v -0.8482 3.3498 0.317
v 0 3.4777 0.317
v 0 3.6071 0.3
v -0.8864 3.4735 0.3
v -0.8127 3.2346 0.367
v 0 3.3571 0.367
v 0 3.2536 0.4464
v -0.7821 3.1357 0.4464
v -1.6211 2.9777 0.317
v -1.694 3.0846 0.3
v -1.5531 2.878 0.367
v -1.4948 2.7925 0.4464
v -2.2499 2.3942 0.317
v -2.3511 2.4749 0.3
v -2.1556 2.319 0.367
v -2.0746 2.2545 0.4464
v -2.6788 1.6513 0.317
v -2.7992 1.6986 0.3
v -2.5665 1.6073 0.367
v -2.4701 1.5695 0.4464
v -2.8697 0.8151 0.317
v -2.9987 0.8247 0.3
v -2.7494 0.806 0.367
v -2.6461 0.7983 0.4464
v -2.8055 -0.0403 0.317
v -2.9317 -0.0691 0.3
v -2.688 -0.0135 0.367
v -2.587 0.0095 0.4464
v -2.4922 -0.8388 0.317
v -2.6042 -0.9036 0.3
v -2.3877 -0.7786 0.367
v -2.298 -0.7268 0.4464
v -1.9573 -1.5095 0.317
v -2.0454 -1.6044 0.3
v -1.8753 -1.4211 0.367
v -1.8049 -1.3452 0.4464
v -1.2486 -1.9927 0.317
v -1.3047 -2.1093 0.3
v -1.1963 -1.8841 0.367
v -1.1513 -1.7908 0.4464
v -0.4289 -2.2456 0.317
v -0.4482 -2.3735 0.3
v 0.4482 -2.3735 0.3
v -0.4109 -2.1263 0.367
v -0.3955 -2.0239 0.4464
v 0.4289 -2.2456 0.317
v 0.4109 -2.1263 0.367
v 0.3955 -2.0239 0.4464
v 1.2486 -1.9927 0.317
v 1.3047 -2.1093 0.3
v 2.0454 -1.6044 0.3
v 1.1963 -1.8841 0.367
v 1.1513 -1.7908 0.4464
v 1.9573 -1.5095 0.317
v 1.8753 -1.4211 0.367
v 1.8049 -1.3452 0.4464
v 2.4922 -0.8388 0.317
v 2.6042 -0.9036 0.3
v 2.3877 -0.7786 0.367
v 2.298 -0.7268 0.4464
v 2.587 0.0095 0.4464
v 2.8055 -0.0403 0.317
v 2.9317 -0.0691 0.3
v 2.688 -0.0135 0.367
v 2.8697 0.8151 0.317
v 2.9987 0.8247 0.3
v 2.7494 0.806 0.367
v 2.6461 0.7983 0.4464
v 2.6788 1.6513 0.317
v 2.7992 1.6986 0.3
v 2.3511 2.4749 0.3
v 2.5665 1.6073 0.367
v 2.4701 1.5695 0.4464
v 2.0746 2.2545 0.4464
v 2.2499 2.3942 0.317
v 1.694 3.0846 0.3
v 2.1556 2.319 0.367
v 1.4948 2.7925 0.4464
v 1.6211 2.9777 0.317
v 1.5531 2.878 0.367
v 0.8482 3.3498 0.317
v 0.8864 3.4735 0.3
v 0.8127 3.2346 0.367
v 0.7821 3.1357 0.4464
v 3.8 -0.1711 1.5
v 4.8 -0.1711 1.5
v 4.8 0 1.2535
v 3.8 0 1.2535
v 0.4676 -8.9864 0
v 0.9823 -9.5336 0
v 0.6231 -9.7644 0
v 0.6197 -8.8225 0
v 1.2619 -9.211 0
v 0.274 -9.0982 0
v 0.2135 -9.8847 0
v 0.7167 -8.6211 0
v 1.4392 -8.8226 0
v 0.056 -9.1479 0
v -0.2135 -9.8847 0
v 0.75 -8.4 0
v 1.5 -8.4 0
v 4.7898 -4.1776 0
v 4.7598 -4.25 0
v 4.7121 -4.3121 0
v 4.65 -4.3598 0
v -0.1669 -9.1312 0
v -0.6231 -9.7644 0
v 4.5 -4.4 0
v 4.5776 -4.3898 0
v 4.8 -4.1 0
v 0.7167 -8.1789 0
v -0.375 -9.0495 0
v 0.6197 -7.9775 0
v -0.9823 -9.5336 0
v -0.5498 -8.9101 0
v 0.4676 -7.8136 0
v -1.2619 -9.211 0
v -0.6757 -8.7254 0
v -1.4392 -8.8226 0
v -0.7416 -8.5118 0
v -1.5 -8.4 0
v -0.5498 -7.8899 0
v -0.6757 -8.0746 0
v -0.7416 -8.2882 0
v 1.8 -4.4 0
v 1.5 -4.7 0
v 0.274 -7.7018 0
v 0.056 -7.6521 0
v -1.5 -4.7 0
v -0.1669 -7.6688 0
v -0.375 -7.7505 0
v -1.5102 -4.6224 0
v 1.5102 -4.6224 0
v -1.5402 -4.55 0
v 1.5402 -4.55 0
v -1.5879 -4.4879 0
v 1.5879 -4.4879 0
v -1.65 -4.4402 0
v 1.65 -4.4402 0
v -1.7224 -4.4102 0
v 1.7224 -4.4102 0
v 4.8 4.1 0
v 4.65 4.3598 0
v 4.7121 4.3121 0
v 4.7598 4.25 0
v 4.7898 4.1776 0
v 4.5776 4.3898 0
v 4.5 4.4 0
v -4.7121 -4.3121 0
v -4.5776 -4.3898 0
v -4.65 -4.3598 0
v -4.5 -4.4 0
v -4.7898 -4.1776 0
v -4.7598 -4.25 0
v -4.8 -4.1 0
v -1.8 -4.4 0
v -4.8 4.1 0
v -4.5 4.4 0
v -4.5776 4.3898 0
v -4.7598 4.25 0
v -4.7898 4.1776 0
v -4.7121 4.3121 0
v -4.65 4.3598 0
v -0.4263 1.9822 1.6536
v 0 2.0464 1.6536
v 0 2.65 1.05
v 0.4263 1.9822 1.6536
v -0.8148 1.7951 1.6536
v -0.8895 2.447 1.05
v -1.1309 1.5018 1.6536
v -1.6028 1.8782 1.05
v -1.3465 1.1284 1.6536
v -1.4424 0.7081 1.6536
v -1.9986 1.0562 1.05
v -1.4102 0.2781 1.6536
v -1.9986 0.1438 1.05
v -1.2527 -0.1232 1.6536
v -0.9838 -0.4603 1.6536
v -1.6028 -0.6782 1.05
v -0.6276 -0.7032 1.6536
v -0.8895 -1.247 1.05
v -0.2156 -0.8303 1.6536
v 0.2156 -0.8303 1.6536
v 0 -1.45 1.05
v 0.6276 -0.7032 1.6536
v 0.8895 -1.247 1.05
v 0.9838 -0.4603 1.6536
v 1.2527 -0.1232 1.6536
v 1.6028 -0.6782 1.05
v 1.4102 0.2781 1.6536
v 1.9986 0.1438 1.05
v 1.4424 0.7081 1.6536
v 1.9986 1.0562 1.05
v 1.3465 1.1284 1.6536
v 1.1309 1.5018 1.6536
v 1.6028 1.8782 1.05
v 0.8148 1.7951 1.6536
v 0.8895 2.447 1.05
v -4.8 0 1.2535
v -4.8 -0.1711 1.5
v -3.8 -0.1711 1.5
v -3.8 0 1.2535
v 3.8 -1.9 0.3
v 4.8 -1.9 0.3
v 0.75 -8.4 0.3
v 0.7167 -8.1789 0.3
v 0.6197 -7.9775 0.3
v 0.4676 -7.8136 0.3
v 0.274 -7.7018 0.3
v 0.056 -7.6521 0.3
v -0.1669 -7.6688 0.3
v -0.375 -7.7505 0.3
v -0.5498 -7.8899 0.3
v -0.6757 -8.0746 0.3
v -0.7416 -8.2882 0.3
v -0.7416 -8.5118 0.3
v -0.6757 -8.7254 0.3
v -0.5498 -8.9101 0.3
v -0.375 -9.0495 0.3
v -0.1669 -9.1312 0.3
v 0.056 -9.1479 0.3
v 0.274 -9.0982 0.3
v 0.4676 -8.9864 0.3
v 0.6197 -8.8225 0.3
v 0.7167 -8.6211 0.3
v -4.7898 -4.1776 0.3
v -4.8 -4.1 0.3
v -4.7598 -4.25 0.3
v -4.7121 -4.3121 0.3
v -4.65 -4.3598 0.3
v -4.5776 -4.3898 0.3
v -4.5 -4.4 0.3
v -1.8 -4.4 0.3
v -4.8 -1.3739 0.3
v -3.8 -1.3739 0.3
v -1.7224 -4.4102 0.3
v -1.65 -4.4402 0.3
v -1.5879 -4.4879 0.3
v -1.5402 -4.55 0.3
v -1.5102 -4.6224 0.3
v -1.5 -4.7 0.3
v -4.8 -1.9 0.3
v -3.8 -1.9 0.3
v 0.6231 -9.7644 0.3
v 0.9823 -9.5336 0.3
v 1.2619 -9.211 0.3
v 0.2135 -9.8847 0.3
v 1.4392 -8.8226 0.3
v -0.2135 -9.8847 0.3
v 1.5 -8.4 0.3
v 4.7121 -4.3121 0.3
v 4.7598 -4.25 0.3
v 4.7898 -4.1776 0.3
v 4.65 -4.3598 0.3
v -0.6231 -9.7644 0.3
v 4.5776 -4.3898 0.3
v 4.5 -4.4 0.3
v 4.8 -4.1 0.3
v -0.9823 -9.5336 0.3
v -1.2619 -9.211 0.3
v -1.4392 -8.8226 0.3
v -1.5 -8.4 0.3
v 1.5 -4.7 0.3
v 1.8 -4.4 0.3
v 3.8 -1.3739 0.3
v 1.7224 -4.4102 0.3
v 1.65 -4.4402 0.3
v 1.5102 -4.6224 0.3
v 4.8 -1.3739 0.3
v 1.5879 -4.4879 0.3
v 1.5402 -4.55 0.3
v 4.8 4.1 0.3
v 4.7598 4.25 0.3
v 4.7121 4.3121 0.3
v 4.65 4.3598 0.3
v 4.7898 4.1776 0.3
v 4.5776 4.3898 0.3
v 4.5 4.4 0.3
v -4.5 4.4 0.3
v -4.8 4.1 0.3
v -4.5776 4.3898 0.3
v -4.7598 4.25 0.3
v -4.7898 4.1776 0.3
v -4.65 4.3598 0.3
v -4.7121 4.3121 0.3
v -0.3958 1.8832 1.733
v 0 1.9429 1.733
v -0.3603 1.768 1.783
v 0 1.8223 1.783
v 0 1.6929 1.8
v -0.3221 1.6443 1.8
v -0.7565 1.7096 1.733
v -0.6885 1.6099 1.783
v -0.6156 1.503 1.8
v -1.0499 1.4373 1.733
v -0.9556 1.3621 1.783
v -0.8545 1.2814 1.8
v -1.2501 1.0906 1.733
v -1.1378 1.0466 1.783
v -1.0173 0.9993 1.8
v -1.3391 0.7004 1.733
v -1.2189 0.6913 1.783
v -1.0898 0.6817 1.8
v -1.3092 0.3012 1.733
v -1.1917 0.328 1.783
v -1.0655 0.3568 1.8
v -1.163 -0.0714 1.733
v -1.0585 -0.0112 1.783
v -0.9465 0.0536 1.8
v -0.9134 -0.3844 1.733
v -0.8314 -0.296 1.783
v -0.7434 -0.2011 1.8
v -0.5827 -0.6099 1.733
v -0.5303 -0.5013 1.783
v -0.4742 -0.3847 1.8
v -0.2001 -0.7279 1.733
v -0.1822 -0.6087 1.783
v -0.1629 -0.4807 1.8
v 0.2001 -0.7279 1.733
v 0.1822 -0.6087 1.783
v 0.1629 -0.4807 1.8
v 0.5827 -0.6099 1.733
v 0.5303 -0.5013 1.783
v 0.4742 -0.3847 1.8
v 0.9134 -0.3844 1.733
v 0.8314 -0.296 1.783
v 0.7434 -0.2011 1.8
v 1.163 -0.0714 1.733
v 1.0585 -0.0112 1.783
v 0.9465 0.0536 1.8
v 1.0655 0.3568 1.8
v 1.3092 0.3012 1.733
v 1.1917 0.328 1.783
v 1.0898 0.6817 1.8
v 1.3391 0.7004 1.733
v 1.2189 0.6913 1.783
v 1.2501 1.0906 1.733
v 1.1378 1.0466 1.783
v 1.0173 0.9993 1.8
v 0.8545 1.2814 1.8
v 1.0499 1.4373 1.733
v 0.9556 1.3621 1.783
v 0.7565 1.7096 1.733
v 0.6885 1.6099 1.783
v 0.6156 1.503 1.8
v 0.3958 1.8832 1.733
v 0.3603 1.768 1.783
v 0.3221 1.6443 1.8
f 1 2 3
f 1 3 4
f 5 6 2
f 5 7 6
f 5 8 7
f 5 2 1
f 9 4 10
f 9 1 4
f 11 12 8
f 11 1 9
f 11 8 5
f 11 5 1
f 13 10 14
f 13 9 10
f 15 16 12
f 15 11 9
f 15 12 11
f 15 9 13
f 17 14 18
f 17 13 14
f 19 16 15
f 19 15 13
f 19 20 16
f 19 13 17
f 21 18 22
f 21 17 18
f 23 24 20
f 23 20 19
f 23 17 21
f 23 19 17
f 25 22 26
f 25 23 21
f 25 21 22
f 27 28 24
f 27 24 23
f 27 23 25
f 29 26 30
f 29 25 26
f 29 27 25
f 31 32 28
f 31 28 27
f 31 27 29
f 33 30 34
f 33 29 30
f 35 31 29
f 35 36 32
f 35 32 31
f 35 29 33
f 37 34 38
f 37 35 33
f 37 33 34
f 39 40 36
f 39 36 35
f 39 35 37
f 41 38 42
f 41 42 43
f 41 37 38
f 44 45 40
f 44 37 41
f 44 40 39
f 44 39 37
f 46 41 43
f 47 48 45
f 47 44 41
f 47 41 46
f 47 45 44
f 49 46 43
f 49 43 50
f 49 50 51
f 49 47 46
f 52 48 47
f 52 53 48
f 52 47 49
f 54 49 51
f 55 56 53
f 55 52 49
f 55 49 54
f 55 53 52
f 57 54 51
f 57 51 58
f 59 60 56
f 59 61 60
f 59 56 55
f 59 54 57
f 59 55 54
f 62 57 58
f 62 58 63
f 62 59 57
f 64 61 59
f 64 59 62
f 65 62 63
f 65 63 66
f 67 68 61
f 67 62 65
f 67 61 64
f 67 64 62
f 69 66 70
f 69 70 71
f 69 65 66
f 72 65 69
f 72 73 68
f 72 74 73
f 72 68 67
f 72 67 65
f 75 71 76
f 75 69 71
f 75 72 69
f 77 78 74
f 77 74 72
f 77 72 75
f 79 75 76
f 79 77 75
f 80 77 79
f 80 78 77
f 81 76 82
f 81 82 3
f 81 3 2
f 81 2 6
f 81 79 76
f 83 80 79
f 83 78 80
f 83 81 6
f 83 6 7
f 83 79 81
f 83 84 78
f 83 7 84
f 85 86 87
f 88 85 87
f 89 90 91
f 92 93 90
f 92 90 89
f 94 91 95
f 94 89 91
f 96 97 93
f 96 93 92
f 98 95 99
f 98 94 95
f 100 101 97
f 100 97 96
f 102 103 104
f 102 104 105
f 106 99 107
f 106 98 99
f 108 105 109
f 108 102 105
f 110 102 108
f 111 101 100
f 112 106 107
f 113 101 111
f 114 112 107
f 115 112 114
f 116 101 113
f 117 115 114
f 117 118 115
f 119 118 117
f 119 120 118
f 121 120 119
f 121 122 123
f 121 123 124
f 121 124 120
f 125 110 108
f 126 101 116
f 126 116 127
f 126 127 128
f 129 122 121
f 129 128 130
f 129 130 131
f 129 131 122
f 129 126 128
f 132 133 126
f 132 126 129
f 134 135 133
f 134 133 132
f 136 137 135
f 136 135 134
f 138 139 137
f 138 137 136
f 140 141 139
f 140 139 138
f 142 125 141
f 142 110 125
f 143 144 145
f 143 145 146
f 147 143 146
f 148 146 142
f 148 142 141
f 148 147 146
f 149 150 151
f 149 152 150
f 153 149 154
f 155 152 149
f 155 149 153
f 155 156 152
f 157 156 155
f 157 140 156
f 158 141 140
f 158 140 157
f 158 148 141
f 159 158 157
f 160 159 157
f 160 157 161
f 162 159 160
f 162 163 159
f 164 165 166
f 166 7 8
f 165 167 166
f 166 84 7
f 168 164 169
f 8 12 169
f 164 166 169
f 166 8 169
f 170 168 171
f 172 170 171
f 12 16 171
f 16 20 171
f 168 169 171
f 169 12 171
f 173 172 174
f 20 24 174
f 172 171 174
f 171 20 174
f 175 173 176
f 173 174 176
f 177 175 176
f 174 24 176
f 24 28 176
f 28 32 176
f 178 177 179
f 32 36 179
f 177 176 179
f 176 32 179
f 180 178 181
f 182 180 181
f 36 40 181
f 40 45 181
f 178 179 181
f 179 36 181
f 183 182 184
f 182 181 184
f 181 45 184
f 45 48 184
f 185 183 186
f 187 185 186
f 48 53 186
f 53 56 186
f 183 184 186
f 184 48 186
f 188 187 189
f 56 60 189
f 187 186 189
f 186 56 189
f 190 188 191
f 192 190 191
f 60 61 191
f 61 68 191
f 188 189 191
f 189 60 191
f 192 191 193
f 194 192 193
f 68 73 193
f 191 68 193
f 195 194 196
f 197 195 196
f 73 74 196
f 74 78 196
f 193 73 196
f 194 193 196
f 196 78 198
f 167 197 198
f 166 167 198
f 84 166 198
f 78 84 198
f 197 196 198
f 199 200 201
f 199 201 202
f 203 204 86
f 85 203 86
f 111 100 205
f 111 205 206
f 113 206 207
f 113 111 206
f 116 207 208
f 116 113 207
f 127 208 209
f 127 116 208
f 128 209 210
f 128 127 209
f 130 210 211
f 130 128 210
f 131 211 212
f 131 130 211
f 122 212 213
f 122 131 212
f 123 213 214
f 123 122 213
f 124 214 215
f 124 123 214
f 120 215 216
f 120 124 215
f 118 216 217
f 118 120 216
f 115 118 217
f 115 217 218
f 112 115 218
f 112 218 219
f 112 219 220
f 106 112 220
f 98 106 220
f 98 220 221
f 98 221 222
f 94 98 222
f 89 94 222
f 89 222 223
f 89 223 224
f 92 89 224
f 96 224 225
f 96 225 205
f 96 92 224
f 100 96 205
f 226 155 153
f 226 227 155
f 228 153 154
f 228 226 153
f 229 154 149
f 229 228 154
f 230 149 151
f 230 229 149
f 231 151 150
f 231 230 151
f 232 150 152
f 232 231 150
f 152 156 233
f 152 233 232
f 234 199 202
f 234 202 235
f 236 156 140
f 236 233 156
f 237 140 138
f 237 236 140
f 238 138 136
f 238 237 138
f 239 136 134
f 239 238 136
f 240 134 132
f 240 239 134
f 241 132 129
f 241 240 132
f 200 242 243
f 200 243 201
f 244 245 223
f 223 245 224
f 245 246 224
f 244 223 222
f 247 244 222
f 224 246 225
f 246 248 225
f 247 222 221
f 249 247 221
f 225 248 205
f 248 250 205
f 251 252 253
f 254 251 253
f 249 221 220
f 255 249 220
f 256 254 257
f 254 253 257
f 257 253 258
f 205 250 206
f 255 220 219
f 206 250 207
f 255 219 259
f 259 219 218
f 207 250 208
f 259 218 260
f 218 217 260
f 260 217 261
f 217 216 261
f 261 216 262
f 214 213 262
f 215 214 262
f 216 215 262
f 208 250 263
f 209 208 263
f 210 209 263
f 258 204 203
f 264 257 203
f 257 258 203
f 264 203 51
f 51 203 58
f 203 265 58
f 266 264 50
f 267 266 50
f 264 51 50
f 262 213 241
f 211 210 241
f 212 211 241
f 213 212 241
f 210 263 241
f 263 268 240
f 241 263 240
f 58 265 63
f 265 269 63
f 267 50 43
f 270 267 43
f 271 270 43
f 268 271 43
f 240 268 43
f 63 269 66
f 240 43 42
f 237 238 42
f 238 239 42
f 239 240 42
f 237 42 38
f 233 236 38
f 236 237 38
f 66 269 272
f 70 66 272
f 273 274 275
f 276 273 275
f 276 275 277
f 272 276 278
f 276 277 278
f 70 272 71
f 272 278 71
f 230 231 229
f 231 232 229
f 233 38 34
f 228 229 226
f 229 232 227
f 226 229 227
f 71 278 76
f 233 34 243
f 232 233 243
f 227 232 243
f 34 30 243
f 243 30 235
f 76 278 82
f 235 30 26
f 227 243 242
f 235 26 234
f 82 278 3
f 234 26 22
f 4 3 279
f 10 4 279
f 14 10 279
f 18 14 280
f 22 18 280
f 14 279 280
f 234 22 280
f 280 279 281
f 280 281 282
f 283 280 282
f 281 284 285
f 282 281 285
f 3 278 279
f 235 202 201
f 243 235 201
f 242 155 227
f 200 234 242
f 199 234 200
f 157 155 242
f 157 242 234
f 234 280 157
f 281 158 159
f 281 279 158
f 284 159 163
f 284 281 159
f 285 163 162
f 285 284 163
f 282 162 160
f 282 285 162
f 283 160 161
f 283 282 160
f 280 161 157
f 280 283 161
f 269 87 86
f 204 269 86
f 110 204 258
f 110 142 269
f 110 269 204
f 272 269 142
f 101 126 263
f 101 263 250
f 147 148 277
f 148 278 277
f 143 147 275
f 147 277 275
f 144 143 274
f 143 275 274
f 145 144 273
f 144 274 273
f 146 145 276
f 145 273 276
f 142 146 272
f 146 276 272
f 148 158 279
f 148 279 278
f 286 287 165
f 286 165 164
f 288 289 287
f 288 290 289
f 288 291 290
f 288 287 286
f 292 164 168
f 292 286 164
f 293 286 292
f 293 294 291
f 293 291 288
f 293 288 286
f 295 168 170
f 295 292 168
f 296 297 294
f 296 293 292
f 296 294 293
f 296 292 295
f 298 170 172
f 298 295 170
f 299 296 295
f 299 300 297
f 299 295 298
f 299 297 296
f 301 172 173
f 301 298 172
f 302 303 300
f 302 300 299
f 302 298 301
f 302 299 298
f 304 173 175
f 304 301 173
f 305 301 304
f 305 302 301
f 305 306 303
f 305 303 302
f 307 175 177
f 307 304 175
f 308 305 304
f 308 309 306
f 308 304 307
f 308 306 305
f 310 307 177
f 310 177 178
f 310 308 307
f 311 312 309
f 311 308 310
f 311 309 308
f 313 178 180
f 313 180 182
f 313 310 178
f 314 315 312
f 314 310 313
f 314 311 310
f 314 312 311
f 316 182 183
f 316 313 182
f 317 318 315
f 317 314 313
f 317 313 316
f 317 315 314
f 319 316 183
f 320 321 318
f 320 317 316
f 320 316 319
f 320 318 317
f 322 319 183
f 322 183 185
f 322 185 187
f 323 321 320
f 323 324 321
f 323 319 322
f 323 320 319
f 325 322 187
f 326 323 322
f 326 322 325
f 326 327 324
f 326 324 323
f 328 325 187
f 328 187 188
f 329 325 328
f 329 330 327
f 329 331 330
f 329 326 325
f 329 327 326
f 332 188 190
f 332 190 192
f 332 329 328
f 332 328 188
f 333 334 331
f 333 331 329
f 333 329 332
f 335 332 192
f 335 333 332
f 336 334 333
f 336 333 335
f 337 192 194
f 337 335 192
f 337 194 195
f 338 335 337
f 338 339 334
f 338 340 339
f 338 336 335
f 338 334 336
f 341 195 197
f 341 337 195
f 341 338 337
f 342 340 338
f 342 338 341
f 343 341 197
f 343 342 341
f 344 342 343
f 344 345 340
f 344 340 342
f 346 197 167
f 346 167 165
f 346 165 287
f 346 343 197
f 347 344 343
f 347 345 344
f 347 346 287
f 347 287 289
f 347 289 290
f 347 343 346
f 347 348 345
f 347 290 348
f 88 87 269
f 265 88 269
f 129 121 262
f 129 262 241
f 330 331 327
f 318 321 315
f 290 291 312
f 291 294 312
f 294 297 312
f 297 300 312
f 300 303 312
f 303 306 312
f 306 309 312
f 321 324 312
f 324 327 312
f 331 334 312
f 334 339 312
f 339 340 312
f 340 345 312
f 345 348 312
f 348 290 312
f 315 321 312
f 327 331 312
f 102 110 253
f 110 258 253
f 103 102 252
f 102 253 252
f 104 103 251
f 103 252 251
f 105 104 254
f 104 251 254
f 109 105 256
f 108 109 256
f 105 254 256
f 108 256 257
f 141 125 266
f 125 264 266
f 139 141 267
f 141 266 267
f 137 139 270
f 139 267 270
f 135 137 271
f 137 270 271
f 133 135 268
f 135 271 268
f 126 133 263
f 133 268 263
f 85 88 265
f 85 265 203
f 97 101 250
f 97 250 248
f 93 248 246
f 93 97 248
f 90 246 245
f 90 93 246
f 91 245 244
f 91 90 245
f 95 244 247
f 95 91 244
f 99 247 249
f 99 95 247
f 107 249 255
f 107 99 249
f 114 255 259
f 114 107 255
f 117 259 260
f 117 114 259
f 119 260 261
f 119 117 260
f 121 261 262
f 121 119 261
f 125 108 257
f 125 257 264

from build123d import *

# Parameters (mm, degrees)
SKETCH1_R           = 0.75
BOSS_EXTRUDE1_DEPTH = 0.3
FILLET1_R           = 0.3
BOSS_EXTRUDE2_DEPTH = 1
FILLET2_R           = 0.5


with BuildPart() as part:
    # Sketch1 → Boss-Extrude1 (new body)
    with BuildSketch(Plane.XY):
        with BuildLine():
            Line((-4.8, 4.4), (4.8, 4.4))
            Line((4.8, 4.4), (4.8, -4.4))
            Line((4.8, -4.4), (1.5, -4.4))
            Line((1.5, -4.4), (1.5, -8.4))
            ThreePointArc((1.5, -8.4), (0, -9.9), (-1.5, -8.4))
            Line((-1.5, -8.4), (-1.5, -4.4))
            Line((-1.5, -4.4), (-4.8, -4.4))
            Line((-4.8, -4.4), (-4.8, 4.4))
        make_face()
        with Locations((0, -8.4)):
            Circle(SKETCH1_R, mode=Mode.SUBTRACT)
    extrude(amount=BOSS_EXTRUDE1_DEPTH)

    # Fillet1
    fillet1_edges = [part.edges().sort_by_distance(p)[0] for p in [
        (-4.8, -4.4, 0.15),
        (-4.8, 4.4, 0.15),
        (4.8, 4.4, 0.15),
        (4.8, -4.4, 0.15),
        (1.5, -4.4, 0.15),
        (-1.5, -4.4, 0.15),
    ]]
    fillet(fillet1_edges, radius=FILLET1_R)

    # Sketch2 → Boss-Extrude2 (add)
    with BuildSketch(Plane(origin=(4.8, 0, 0), x_dir=(0, 0, -1), z_dir=(1, 0, 0))):
        Polygon((-0.3, -1.9), (-1.5, -0.171055671), (-1.253545223, 0), (-0.3, -1.373855504), align=None)
    boss_extrude2 = extrude(amount=-BOSS_EXTRUDE2_DEPTH)

    # Mirror1: Boss-Extrude2 across plane
    add(boss_extrude2.mirror(Plane(origin=(0, 0, 0), x_dir=(0, 0, 1), z_dir=(1, 0, 0))))

    # Sketch3 → Revolve1 (revolve)
    with BuildSketch(Plane(origin=(0, 0, 0), x_dir=(0, 0, -1), z_dir=(1, 0, 0))):
        Polygon((-1.8, 0.6), (-1.8, 1.9), (-0.3, 3.4), (-0.3, 0.6), align=None)
    revolve(axis=Axis((0, 0.6, 0.3), (0, 0, 1)))

    # Fillet2
    fillet2_edges = [part.edges().sort_by_distance(p)[0] for p in [
        (0, -0.7, 1.8),
        (0, -2.2, 0.3),
    ]]
    fillet(fillet2_edges, radius=FILLET2_R)


solid = part.part
